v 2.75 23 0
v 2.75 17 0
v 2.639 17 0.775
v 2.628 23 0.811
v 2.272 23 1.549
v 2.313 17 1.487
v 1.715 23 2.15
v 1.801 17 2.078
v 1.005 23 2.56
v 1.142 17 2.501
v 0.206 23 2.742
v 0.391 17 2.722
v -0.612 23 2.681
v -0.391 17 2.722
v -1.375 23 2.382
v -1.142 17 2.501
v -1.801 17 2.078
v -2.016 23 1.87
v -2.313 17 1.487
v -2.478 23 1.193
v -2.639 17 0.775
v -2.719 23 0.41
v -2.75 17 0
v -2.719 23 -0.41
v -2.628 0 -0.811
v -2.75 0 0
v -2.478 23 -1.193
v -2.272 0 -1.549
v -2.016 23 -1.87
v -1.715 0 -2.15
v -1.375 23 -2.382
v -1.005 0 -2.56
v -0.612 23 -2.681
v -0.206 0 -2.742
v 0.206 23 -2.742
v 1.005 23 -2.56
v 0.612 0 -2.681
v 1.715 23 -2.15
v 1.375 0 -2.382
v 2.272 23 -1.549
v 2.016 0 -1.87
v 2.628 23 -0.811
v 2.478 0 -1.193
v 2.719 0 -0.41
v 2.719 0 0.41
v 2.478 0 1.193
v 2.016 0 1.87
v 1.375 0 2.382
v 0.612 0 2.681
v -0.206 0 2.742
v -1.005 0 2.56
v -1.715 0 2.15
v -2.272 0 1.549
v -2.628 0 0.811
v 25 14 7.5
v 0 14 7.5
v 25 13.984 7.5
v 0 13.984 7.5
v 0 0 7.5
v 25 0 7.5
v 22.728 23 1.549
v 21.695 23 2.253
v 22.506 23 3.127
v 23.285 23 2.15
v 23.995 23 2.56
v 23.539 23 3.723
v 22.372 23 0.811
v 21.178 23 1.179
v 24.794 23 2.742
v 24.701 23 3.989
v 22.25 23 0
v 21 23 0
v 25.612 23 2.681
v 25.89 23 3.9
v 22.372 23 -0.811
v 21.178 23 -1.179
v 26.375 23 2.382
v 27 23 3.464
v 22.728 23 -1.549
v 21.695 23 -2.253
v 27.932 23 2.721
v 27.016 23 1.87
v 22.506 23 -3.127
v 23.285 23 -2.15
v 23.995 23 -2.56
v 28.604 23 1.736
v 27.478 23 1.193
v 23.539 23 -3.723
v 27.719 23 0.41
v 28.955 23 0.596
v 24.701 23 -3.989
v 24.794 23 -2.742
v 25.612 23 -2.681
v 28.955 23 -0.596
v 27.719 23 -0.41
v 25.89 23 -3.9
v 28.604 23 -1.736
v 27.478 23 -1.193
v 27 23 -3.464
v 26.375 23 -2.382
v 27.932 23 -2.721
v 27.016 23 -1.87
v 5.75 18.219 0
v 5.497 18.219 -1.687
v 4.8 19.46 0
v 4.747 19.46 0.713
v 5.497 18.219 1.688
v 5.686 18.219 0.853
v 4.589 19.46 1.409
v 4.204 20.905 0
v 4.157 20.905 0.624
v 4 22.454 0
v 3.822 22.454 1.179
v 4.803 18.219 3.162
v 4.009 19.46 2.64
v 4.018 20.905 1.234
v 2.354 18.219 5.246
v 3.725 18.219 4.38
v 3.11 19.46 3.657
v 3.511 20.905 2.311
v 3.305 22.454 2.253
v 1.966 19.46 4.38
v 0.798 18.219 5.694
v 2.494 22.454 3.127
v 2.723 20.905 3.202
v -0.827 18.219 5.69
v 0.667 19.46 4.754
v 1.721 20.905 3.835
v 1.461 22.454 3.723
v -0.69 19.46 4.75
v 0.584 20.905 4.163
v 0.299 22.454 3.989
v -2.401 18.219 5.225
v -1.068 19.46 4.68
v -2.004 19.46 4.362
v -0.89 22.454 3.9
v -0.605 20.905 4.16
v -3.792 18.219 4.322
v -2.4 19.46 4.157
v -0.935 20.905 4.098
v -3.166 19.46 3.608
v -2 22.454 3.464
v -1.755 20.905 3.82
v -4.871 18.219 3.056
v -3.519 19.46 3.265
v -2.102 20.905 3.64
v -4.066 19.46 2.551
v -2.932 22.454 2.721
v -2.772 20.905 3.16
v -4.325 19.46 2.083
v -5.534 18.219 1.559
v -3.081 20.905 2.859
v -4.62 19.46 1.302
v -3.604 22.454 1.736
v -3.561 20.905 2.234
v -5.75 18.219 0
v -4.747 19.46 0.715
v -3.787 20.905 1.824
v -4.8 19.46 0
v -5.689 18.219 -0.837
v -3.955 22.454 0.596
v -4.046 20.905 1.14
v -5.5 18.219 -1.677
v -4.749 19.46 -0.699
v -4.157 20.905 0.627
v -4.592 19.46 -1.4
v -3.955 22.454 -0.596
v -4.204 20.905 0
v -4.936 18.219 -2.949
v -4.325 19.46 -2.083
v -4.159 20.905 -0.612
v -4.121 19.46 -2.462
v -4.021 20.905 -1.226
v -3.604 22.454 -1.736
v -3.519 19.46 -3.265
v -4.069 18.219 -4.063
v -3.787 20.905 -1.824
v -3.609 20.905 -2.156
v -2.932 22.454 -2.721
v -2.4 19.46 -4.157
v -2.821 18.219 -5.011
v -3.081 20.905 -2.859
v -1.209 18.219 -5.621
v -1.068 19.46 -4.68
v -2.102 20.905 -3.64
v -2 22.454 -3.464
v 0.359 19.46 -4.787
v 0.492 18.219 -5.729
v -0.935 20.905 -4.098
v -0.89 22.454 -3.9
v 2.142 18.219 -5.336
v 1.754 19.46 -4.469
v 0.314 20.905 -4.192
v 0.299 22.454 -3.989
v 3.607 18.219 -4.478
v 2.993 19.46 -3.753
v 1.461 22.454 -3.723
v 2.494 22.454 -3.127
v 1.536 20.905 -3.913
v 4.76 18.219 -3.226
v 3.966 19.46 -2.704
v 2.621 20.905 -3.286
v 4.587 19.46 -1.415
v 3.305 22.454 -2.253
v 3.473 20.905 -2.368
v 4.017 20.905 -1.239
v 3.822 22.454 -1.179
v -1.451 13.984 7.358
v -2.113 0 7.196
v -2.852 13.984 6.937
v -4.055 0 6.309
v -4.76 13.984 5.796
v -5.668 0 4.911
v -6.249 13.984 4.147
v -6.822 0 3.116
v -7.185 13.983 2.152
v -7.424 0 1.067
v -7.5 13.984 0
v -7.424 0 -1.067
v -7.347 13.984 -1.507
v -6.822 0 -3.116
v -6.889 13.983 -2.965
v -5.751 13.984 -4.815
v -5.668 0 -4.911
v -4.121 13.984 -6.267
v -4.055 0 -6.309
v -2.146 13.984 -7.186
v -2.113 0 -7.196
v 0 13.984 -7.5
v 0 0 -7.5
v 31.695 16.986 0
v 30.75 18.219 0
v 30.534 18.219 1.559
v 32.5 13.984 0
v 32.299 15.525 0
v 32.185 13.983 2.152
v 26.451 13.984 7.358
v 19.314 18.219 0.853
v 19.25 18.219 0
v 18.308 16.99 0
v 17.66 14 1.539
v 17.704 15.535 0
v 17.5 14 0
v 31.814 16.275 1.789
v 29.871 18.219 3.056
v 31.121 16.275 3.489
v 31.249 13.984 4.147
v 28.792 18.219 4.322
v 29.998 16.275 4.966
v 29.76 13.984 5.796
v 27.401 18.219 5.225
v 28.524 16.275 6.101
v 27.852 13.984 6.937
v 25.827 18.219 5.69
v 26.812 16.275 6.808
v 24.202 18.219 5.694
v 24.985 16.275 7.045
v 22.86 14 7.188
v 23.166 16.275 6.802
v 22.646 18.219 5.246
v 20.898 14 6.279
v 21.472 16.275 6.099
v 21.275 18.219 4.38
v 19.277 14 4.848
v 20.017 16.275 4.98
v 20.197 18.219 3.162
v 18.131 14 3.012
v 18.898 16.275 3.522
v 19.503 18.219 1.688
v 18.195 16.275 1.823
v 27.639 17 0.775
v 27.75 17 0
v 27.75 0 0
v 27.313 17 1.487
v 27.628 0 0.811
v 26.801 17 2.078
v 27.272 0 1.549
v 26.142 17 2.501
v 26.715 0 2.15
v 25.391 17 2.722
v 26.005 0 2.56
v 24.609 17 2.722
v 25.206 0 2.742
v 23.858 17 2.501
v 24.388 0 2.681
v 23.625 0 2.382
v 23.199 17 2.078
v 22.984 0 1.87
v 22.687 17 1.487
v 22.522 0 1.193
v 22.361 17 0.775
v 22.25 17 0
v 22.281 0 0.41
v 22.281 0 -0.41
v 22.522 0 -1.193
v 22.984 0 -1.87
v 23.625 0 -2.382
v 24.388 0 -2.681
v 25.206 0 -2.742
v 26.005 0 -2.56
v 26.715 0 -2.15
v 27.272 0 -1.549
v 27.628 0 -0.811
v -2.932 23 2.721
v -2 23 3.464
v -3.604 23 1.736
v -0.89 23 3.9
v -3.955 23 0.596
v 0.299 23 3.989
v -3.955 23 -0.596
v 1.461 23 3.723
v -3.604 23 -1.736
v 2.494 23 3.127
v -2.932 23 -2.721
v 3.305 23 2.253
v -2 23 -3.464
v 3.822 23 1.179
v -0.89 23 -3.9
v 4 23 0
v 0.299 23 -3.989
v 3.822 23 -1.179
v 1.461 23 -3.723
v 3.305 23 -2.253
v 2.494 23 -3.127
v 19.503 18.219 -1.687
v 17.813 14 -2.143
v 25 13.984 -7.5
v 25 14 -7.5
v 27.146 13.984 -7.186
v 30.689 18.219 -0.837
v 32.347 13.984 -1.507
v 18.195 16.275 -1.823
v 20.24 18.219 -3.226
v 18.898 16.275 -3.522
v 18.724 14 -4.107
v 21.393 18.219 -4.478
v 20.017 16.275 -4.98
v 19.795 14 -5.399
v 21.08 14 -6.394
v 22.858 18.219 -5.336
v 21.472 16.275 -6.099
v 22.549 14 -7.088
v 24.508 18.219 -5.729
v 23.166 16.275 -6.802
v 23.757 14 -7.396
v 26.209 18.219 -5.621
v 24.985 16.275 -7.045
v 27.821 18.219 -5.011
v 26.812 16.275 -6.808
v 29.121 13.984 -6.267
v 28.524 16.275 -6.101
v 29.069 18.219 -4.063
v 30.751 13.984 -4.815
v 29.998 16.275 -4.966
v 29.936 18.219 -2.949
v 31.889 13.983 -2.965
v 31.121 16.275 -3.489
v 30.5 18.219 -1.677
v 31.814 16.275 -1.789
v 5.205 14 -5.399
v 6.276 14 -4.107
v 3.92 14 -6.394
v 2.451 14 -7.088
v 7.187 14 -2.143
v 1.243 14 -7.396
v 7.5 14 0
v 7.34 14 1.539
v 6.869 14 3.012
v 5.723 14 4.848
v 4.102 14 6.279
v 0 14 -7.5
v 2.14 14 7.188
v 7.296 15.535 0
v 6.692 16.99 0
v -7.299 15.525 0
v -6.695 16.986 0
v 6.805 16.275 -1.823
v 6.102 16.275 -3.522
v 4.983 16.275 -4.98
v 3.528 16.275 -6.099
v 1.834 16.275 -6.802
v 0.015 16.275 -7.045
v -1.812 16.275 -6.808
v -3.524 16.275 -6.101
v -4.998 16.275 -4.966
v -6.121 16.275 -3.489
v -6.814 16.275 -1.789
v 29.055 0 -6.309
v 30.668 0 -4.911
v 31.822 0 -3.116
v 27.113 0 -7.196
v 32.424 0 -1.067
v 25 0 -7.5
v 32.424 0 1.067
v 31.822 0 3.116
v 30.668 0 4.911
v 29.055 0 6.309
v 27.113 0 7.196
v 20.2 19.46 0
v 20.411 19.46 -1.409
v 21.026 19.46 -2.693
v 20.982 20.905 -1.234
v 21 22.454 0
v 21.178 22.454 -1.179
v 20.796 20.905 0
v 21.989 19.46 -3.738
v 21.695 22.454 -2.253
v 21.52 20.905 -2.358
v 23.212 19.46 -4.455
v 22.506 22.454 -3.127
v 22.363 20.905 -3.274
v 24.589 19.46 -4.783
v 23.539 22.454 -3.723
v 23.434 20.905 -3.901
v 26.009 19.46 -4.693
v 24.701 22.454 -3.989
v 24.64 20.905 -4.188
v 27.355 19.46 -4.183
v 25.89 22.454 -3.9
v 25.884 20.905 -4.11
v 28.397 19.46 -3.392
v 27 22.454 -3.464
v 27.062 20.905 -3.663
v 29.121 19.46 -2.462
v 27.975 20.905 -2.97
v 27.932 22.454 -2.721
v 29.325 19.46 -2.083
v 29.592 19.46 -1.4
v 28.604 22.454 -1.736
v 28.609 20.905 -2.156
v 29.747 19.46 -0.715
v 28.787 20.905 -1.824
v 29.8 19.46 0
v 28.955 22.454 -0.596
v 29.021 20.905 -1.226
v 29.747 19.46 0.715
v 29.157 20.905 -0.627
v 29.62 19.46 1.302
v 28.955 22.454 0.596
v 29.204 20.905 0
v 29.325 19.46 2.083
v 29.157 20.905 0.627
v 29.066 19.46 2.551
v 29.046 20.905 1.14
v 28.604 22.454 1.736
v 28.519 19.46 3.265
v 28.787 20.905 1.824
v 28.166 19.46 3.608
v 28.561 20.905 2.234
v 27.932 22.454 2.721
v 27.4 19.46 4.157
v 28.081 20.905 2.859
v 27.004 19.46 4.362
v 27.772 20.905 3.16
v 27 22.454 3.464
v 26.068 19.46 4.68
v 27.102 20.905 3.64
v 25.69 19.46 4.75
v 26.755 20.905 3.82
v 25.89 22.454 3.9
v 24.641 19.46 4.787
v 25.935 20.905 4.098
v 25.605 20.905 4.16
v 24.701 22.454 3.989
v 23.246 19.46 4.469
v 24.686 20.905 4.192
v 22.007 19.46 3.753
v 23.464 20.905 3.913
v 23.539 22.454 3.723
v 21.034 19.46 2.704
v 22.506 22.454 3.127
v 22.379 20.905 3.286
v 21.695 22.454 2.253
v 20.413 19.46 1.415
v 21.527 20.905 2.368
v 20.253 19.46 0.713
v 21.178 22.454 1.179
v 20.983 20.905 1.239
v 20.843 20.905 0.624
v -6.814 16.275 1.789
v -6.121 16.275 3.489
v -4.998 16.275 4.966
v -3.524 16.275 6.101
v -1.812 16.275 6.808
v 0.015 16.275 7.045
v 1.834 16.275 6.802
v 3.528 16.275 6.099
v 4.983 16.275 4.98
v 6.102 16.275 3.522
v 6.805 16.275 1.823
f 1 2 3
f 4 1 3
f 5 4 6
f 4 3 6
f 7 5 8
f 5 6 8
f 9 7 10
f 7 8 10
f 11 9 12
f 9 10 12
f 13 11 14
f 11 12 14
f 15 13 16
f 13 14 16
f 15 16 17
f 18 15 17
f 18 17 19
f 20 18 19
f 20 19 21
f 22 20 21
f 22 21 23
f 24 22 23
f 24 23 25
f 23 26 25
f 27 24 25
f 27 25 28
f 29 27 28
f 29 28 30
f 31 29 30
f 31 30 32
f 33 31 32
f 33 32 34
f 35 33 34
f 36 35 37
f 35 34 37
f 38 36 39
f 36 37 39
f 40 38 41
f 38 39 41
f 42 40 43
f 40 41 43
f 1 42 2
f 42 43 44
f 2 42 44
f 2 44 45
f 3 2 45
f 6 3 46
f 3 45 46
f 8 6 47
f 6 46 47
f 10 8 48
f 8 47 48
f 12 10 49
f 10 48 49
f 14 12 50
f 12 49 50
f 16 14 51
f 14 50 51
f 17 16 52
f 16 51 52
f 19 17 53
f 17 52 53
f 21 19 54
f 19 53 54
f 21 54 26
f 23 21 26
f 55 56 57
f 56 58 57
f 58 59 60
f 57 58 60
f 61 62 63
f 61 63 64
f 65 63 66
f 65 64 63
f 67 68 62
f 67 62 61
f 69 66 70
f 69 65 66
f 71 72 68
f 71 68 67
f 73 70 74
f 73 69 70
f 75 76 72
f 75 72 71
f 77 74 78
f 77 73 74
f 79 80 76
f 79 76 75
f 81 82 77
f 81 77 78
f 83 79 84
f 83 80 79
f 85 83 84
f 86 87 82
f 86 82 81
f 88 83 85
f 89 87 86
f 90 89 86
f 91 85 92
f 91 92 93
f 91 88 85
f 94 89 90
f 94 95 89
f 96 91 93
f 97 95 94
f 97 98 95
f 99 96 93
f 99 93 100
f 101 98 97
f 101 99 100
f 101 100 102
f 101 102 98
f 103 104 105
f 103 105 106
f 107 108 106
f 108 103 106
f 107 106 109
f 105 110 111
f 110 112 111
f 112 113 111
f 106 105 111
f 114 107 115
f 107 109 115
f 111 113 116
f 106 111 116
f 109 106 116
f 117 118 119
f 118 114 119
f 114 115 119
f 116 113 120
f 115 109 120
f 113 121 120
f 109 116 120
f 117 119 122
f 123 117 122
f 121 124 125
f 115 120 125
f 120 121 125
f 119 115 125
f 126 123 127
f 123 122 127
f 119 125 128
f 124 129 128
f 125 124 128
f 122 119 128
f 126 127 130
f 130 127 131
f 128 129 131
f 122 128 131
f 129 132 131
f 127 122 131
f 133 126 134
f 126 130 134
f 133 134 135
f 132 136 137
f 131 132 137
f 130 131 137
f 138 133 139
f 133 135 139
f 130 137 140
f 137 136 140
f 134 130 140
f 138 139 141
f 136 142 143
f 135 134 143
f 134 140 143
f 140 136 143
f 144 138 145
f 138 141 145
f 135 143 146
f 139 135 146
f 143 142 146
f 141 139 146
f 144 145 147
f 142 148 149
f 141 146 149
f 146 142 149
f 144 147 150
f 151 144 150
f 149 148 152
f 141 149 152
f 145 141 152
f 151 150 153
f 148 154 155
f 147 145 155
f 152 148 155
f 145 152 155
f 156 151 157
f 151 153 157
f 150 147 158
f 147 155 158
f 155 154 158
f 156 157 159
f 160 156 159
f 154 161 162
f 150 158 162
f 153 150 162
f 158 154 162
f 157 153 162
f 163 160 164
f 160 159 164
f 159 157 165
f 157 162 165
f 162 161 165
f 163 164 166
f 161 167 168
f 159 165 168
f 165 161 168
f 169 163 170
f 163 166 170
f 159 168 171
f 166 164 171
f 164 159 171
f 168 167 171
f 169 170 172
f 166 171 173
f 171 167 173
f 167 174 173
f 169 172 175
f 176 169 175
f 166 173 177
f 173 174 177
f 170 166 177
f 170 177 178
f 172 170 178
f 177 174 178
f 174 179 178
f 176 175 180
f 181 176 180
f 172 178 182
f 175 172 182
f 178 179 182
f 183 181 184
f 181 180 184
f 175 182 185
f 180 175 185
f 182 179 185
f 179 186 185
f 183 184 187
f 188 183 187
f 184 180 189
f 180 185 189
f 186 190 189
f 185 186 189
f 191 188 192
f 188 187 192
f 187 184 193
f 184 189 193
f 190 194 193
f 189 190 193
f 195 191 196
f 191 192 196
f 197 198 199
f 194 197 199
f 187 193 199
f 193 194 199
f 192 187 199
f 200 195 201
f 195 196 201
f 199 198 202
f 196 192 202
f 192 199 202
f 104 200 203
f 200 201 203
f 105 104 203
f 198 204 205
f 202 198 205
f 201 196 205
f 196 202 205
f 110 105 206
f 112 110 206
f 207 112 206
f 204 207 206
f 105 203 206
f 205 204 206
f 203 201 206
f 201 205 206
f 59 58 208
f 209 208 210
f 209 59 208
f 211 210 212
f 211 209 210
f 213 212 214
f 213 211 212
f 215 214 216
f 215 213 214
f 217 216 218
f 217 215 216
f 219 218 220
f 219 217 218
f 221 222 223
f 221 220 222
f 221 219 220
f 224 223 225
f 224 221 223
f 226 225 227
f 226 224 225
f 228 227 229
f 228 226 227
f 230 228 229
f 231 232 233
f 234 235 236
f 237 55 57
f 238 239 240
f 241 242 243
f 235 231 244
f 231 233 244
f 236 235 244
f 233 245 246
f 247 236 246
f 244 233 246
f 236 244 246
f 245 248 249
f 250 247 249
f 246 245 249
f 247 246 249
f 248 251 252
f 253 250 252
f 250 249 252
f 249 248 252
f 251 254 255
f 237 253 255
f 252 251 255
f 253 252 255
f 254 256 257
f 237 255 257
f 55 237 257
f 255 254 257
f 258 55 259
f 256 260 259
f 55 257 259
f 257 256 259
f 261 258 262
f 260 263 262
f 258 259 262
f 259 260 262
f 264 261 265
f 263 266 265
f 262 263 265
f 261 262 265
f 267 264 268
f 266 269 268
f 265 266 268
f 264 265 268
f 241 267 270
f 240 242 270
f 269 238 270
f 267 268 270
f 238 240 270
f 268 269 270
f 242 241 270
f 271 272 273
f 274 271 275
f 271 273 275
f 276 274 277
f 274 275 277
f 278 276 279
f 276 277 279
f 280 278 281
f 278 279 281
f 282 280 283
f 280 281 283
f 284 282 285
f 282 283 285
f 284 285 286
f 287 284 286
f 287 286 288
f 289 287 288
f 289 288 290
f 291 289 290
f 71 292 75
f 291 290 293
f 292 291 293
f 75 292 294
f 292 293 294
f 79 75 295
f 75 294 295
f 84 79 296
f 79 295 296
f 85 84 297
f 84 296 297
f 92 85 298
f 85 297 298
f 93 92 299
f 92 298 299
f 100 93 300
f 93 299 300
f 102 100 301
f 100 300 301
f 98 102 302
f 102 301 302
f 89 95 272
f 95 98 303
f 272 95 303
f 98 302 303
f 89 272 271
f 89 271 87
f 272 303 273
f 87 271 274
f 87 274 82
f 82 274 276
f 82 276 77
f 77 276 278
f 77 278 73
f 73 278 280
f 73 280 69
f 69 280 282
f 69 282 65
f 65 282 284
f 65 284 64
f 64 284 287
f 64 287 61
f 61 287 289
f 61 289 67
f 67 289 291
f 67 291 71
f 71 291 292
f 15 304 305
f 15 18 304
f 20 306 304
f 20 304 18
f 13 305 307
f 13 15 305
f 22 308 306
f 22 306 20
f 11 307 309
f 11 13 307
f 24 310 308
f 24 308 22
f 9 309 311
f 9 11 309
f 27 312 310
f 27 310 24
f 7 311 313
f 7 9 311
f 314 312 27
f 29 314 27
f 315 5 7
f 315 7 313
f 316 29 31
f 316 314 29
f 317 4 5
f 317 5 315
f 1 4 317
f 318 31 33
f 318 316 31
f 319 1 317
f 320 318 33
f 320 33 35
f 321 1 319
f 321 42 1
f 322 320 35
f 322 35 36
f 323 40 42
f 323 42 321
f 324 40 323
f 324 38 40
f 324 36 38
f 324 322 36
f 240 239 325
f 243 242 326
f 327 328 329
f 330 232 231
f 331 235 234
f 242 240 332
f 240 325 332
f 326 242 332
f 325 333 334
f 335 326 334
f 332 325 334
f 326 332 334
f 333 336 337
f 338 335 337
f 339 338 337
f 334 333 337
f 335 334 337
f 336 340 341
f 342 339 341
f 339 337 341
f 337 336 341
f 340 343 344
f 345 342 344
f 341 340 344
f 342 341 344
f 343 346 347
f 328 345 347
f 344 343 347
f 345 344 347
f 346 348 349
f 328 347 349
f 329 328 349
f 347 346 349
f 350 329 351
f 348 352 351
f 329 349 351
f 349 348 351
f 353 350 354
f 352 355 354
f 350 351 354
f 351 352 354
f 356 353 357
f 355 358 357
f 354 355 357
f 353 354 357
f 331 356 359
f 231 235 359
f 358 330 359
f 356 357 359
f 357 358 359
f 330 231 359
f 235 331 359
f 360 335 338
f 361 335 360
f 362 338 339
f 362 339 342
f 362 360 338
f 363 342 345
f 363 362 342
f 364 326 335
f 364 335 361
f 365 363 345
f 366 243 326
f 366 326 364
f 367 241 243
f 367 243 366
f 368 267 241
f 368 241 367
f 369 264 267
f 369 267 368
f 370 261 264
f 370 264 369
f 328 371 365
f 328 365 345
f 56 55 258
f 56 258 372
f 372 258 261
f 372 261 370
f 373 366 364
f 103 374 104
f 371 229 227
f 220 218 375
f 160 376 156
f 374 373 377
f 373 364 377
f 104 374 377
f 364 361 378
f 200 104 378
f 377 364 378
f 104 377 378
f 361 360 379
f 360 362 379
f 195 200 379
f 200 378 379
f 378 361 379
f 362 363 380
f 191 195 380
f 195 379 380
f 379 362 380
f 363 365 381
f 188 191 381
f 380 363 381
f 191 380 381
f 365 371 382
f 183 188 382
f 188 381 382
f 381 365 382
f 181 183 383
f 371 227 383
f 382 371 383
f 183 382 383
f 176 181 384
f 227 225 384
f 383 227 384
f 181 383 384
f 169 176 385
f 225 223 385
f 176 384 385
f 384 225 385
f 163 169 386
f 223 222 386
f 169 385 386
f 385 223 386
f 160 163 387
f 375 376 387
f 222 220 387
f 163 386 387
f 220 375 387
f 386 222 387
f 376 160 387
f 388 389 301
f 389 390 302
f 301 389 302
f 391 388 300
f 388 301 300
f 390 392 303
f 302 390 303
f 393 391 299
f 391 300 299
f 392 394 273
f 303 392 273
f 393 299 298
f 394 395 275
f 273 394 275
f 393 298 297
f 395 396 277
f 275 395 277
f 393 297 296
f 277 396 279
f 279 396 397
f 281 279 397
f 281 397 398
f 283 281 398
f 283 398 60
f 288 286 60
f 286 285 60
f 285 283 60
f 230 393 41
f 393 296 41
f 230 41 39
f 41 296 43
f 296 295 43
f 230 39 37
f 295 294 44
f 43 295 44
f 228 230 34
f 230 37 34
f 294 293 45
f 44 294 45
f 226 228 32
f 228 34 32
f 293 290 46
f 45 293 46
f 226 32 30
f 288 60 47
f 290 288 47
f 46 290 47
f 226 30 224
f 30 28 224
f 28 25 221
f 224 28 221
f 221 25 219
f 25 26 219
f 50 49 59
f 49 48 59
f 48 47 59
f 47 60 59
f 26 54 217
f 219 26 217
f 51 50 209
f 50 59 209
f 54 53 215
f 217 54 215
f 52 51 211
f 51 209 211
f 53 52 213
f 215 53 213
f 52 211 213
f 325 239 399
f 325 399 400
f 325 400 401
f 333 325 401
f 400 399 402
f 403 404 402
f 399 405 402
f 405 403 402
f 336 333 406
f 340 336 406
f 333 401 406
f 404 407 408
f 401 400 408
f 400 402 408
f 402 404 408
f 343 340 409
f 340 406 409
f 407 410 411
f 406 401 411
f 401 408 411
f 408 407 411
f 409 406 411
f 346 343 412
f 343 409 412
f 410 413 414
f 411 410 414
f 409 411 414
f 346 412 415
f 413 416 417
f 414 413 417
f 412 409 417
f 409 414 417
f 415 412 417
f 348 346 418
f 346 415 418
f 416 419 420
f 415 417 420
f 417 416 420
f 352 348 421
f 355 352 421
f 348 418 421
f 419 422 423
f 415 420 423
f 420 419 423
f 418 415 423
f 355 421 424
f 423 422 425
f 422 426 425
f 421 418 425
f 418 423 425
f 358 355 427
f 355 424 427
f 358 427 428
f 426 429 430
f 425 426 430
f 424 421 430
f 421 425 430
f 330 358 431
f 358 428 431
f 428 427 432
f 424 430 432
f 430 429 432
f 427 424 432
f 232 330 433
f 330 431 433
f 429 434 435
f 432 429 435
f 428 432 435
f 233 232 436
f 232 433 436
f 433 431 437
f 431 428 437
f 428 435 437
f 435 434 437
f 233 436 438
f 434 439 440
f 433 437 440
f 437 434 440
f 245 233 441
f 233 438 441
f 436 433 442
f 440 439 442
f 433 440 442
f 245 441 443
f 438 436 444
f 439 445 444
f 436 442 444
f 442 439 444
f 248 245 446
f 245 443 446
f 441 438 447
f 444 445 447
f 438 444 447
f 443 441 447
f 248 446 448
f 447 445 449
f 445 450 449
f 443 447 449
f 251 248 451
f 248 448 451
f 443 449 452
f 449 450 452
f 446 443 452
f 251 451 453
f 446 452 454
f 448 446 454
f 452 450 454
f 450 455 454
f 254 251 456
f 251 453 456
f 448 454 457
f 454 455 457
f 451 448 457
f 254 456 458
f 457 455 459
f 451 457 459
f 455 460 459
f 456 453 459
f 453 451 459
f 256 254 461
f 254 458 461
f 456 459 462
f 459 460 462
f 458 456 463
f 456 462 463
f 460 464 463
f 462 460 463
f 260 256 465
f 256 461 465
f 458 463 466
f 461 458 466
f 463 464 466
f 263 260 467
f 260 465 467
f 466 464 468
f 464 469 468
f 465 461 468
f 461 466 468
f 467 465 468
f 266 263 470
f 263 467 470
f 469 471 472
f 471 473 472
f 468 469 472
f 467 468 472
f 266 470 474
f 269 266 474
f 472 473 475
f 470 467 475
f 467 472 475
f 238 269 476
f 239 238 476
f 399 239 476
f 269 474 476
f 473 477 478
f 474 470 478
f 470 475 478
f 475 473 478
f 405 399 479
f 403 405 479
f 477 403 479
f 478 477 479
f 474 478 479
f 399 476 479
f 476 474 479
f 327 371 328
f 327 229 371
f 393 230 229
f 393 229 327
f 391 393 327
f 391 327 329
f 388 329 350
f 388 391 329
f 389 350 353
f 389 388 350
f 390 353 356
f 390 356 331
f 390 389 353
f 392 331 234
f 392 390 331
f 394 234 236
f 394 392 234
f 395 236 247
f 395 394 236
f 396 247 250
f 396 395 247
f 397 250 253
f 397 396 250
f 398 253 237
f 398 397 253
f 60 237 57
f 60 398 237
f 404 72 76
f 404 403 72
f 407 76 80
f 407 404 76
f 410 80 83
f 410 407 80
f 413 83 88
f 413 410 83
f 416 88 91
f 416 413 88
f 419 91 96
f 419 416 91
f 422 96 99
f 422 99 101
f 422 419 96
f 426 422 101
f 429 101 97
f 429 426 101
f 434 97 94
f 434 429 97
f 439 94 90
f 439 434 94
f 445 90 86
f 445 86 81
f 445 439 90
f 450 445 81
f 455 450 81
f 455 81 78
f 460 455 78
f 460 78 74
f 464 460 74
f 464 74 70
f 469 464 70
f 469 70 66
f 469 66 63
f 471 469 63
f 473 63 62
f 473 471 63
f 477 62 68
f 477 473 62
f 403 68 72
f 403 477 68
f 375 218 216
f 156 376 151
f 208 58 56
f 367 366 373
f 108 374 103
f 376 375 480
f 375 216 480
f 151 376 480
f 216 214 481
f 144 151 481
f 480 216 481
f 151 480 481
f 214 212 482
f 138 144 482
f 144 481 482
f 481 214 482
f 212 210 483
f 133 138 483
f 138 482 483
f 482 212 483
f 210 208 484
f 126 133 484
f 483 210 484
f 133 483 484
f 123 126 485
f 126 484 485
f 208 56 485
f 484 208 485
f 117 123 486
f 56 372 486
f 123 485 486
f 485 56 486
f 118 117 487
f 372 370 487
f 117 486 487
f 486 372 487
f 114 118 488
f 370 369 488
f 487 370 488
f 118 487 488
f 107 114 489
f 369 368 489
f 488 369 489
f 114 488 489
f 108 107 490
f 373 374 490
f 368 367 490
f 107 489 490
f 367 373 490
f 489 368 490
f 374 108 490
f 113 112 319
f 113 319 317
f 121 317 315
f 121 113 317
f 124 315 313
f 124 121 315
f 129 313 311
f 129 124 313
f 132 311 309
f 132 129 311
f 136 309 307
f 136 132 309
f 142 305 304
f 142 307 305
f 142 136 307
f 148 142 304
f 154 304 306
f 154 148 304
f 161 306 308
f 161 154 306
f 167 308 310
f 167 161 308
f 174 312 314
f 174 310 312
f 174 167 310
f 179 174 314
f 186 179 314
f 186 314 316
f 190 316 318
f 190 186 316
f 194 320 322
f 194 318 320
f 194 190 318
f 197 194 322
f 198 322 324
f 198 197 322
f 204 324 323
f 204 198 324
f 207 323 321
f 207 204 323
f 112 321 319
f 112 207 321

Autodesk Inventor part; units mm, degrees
ref_plane "XZ Plane" through (0, 0, 0) normal (0, 1, 0) x (-1, 0, 0)
ref_plane "XY Plane" through (0, 0, 0) normal (0, 0, 1) x (1, 0, 0)
sketch "Sketch1" plane through (0, 0, 0) normal (0, 1, 0) x (-1, 0, 0)
  circle A0 centre (0, 0) radius 7.5
  circle A1 centre (0, 0) radius 2.75
  dimension "d0" = 15
  dimension "d1" = 5.5
extrude "Extrusion1" add sketch "Sketch1" along normal blind 17
sketch "Sketch2" plane through (0, 17, 0) normal (0, 1, 0) x (1, 0, 0)
  circle A0 centre (0, 0) radius 2.75 projected
  circle A1 centre (0, 0) radius 2.75
  circle A2 centre (0, 0) radius 4
  dimension "d4" = 5.5
  dimension "d5" = 8
extrude "Extrusion2" add sketch "Sketch2" along normal blind 6
fillet "Fillet1" radius 6 1 edges at (-4, 17, 0)
fillet "Fillet2" radius 6 2 edges at (0, 17, -7.5) (0, 17, 7.5)
ref_plane "Work Plane1" through (12.5, 0, 0) normal (1, 0, 0) x (0, 1, 0)
mirror "Mirror1" about plane through (12.5, 0, 0) normal (1, 0, 0) of "Extrusion1", "Extrusion2", "Fillet1", "Fillet2"
sketch "Sketch3" plane through (0, 0, 0) normal (0, 1, 0) x (-1, 0, 0)
  circle A0 centre (-25, 0) radius 2.75 projected
  line L0 (-25, 0) -> (-25, 2.75)
  line L1 (-25, 0) -> (-25, -2.75)
  line L2 (0, 0) -> (0, -2.75)
  circle A1 centre (0, 0) radius 2.75 projected
  line L3 (0, 0) -> (0, 2.75)
  line L4 (-25, 2.75) -> (0, 2.75)
  line L5 (0, 2.75) -> (0, 7.5)
  line L6 (0, 7.5) -> (-25, 7.5)
  line L7 (-25, 7.5) -> (-25, 2.75)
  line L8 (-25, -2.75) -> (0, -2.75)
  line L9 (0, -2.75) -> (0, -7.5)
  line L10 (0, -7.5) -> (-25, -7.5)
  line L11 (-25, -7.5) -> (-25, -2.75)
  dimension "d11" = 25
  dimension "d12" = 4.75
  dimension "d13" = 25
  dimension "d14" = 4.75
extrude "Extrusion3" add sketch "Sketch3" along normal blind 14 contours A0 L4 A1 L8 | L7 L6 L5 L4 | L8 L9 L10 L11
properties part number "4mm_Roller_Spacer_simple3mm"
